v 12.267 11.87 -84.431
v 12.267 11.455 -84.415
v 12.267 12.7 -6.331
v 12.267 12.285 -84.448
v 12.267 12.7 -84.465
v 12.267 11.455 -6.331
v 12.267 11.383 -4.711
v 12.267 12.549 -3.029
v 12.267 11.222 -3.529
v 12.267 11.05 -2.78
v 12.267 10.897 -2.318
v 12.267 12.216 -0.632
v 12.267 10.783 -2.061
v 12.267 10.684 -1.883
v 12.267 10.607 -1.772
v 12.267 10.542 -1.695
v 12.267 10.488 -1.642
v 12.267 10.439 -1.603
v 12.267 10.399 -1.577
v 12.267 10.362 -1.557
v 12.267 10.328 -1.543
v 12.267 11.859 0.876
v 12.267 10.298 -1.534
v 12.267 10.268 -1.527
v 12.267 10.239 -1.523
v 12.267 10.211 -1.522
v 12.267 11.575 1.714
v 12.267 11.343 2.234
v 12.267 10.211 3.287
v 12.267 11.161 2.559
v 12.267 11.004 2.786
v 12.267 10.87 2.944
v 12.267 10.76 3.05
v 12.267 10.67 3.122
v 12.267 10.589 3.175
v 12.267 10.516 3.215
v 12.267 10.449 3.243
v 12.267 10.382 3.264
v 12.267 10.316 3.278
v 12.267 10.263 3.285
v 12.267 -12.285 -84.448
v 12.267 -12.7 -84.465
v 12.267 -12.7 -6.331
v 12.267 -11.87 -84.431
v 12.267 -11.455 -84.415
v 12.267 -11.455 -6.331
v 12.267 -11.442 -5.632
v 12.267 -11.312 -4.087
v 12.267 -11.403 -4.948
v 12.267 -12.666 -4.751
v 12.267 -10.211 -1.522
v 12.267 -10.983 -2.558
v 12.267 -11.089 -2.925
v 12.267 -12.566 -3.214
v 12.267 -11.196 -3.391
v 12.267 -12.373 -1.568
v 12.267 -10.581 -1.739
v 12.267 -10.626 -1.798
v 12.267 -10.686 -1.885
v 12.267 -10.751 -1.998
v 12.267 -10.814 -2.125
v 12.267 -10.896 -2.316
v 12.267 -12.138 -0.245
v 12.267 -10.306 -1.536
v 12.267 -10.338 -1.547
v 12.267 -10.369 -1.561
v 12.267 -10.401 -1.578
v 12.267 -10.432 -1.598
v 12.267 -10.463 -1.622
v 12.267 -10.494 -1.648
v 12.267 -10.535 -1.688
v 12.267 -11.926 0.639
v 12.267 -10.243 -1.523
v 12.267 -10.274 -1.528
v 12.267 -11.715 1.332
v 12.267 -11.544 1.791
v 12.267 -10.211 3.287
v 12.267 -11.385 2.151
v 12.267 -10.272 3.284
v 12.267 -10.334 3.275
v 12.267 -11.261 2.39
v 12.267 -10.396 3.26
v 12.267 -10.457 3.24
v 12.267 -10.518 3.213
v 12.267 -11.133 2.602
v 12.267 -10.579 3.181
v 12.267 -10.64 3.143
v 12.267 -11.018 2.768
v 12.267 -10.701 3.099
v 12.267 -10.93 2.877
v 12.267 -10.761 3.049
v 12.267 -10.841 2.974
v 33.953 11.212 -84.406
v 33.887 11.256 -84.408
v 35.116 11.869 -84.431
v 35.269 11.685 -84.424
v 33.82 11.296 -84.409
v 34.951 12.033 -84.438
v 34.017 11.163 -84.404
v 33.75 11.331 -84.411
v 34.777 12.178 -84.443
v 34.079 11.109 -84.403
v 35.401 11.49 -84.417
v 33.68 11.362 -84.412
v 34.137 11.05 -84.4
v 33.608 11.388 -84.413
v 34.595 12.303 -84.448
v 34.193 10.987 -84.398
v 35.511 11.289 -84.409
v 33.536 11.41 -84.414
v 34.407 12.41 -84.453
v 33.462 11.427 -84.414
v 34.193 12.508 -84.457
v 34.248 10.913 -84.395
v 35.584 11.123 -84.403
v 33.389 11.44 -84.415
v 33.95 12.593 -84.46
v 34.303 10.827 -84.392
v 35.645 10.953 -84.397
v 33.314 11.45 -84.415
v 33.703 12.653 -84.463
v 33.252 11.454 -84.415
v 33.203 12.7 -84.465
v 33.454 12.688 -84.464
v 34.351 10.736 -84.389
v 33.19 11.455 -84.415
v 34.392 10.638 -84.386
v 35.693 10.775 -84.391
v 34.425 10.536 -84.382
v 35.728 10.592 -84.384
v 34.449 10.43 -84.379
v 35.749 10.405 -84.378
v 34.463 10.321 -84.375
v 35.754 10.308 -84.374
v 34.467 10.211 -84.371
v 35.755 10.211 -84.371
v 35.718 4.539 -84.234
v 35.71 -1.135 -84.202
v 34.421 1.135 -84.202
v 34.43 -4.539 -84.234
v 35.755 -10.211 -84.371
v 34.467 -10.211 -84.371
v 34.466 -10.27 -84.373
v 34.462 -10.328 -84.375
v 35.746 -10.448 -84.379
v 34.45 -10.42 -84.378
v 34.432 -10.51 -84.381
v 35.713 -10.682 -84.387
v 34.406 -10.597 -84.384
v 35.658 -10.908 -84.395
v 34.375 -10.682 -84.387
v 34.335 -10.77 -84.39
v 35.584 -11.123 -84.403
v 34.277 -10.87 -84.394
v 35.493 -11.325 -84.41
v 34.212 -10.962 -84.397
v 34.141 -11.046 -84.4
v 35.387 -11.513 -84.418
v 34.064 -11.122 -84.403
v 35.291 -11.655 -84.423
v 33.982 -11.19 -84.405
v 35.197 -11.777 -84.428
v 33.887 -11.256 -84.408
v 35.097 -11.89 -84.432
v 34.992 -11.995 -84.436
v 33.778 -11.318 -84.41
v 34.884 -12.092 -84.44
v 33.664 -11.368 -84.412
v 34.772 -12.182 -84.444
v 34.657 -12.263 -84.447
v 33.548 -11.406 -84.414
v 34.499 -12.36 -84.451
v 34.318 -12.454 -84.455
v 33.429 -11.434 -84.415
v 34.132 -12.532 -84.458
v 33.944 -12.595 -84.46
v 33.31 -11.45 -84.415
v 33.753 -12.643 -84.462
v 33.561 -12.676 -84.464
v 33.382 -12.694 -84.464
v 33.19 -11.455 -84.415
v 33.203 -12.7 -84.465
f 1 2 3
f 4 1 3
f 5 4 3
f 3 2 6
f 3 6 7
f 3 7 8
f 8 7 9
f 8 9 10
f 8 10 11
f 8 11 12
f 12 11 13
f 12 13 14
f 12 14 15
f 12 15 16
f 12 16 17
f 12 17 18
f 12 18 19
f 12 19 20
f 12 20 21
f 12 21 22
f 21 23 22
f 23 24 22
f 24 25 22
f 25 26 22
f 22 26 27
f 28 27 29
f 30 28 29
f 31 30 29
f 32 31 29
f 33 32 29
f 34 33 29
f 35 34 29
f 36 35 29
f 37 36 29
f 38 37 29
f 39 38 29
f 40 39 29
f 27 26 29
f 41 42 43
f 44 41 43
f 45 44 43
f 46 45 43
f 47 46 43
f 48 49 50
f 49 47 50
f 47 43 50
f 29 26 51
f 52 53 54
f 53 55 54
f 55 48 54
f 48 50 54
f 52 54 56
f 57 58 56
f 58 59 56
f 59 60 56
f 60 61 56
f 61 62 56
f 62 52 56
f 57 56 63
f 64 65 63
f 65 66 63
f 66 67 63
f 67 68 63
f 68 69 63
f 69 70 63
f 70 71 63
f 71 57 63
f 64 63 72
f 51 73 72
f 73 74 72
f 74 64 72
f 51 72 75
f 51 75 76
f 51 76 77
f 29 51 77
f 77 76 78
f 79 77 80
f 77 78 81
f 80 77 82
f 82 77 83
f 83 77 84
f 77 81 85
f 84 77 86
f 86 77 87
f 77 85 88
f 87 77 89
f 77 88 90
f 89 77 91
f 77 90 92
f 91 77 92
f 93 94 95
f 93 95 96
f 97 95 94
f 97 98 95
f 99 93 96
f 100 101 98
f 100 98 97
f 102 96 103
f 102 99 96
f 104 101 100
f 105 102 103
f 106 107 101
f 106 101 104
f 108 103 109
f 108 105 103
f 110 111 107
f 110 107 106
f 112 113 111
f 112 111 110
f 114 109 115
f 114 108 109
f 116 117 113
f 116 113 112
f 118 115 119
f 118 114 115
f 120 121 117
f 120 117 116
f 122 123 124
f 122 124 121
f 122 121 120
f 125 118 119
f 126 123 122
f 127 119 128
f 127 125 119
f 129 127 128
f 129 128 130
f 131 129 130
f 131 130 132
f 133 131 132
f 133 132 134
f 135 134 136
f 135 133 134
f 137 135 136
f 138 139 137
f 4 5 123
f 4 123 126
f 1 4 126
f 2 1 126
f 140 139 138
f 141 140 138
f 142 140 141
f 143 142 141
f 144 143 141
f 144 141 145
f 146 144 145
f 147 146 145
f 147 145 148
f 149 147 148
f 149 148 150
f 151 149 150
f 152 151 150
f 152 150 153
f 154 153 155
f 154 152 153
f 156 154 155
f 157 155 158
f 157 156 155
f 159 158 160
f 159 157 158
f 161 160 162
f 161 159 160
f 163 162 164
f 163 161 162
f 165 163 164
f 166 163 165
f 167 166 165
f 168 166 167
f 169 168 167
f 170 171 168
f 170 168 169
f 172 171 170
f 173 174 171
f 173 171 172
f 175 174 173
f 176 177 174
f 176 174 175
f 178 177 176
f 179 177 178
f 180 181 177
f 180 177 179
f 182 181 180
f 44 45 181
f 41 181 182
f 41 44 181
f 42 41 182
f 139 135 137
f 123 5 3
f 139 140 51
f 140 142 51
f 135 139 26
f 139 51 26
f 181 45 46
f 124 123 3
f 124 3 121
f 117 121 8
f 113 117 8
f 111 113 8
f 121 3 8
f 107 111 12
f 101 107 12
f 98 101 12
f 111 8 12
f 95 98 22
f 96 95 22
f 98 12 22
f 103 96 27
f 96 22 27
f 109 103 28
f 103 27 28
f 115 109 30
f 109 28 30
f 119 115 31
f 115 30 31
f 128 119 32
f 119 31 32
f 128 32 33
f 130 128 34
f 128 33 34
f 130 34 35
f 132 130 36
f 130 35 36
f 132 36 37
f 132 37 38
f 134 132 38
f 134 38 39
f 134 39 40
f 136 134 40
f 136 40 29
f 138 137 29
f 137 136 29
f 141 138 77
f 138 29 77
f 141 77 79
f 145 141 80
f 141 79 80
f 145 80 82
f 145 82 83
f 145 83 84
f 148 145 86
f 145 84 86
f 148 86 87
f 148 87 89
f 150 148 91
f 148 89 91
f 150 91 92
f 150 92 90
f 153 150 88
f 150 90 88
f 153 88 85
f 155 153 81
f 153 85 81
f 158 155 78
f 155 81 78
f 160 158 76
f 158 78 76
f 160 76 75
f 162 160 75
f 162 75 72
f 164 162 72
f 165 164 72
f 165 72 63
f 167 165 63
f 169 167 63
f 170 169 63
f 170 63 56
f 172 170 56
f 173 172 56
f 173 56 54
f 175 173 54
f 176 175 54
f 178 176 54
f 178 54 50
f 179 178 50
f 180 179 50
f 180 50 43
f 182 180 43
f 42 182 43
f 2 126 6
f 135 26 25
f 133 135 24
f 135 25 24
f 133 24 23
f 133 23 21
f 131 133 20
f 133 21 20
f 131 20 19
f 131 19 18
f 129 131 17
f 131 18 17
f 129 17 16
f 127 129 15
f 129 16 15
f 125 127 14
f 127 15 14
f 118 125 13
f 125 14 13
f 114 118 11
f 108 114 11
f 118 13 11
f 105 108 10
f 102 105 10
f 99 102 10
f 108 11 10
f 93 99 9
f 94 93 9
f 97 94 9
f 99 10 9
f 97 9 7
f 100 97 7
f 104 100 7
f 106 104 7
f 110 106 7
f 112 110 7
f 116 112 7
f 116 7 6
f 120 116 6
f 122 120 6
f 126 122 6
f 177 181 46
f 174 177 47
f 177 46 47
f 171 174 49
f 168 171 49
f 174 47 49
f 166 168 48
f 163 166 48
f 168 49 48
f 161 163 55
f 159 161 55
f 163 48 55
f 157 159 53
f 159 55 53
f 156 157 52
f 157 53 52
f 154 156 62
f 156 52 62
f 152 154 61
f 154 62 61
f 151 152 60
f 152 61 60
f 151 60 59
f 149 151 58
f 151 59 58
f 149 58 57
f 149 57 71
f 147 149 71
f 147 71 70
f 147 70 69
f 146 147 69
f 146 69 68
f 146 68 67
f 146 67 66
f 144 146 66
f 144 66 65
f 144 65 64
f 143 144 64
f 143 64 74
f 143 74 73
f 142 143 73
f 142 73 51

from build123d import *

# Parameters (mm, degrees)
F3_DEPTH = 92.038
F4_W     = 44.9782982225
F4_H     = 128.527504392
F5_DEPTH = 25
F7_DEPTH = 50


with BuildPart() as f3:
    # F2 (on line) → F3 (new body)
    with BuildSketch(Plane(origin=(0, 0, 0), x_dir=(0.9659258263, 0, 0.2588190451), z_dir=(0.2588190451, 0, -0.9659258263))):
        with BuildLine():
            Line((-10.2108, -12.7), (10.2108, -12.7))
            ThreePointArc((10.2108, -12.7), (11.9709301997, -11.9709301997), (12.7, -10.2108))
            Line((12.7, -10.2108), (12.7, 10.2108))
            ThreePointArc((12.7, 10.2108), (11.9709301997, 11.9709301997), (10.2108, 12.7))
            Line((10.2108, 12.7), (-10.2108, 12.7))
            ThreePointArc((-10.2108, 12.7), (-11.9709301997, 11.9709301997), (-12.7, 10.2108))
            Line((-12.7, 10.2108), (-12.7, -10.2108))
            ThreePointArc((-12.7, -10.2108), (-11.9709301997, -11.9709301997), (-10.2108, -12.7))
        make_face()
        with BuildLine():
            ThreePointArc((11.4554, -10.2108), (11.0908650999, -11.0908650999), (10.2108, -11.4554))
            Line((10.2108, -11.4554), (-10.2108, -11.4554))
            ThreePointArc((-10.2108, -11.4554), (-11.0908650999, -11.0908650999), (-11.4554, -10.2108))
            Line((-11.4554, -10.2108), (-11.4554, 10.2108))
            ThreePointArc((-11.4554, 10.2108), (-11.0908650999, 11.0908650999), (-10.2108, 11.4554))
            Line((-10.2108, 11.4554), (10.2108, 11.4554))
            ThreePointArc((10.2108, 11.4554), (11.0908650999, 11.0908650999), (11.4554, 10.2108))
            Line((11.4554, 10.2108), (11.4554, -10.2108))
        make_face(mode=Mode.SUBTRACT)
    extrude(amount=F3_DEPTH)

    # F4 (on Front) → F5 (cut, symmetric)
    with BuildSketch(Plane.XZ):
        with Locations((-10.2218911174, -60.9767503232)):
            Rectangle(F4_W, F4_H)
    extrude(amount=F5_DEPTH, both=True, mode=Mode.SUBTRACT)

    # F6 (on Right) → F7 (cut)
    with BuildSketch(Plane.YZ):
        with BuildLine():
            Line((0, -155.816540122), (55.8327542288, -89.3573068549))
            ThreePointArc((55.8327542288, -89.3573068549), (2.0772321925, -84.2070783197), (-51.7434931467, -88.6241505764))
            Line((-51.7434931467, -88.6241505764), (0, -155.816540122))
        make_face()
    extrude(amount=F7_DEPTH, mode=Mode.SUBTRACT)


solid = f3.part
